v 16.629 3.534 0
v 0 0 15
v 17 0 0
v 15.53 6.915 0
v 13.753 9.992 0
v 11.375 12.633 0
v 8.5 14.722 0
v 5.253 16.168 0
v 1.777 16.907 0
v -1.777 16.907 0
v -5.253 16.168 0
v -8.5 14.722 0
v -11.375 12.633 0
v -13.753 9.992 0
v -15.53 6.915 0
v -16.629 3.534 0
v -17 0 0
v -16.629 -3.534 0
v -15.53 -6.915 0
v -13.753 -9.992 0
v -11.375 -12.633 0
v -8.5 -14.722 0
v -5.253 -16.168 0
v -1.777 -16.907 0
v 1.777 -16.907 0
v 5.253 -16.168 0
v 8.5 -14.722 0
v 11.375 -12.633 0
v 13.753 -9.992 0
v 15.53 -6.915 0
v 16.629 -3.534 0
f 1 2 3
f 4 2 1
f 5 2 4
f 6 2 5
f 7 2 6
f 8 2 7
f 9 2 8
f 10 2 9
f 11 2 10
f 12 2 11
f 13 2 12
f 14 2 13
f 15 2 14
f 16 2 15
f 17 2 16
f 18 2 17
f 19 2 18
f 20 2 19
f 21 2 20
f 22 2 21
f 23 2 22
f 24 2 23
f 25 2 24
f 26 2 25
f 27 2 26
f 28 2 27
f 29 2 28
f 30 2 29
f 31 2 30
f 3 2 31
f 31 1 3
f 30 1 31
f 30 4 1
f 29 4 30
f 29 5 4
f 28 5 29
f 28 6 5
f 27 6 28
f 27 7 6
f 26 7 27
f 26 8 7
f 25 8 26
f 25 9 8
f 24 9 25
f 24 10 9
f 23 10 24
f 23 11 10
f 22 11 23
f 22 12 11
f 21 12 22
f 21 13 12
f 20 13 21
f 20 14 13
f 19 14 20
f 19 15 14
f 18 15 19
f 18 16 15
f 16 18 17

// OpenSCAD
// Generated by SolidPython 1.0.1 on 2020-07-29 00:39:25


cylinder(h = 15, r1 = 17, r2 = 0);
/***********************************************
*********      SolidPython code:      **********
************************************************
 
# import packages: SolidPython
from solid import *
from solid.utils import *
from itertools import chain, combinations


class Resize:

    def __init__(self, scad_file):
        self.scad_file = scad_file
        #self.scad_file = import_scad(scad_file)
        # cone/cylinder param:
        self.r1 = 0
        self.r2 = 0
        self.h = 0
        # rectangular prism param:
        self.w = 0
        self.l = 0
        # ellipse param:
        self.r = 0

    # import OpenScad code (file name corresponds to shape)


    # classify shape + parameters
    def assign(self, param1, param2, param3):
        if self.scad_file == 'cone.scad':
            self.r1 = param1
            self.r2 = param2
            self.h = param3
        elif self.scad_file == 'cylinder.scad':
            self.r1 = param1
            self.r2 = param2
            self.h = param3
        elif self.scad_file == 'rectangularPrism.scad':
            self.h = param1
            self.l = param2
            self.w = param3
        else:
            self.r = param1
            self.h = param2

    # resize parameters
    def iterate(self):
        x = range(3, 20, 2)
        i = 1
        if self.scad_file == 'cone.scad':
            tempList = list(combinations(x, 2))
            for temp in tempList:
                param1 = temp[0]
                param2 = temp[1]
                filepath = 'produced_scad_files/' + 'cone' + str(param1) + '_' + str(param2) + '_' + '.scad'
                scad_render_to_file(cylinder(h=param1, r1=param2, r2=0), filepath)

        elif self.scad_file == 'cylinder.scad':
            tempList = list(combinations(x, 3))
            for temp in tempList:
                param1 = temp[0]
                param2 = temp[1]
                filepath = 'produced_scad_files/' + 'cylinder' + str(param1) + '_' + str(param2) + '_' + '.scad'
                scad_render_to_file(cylinder(h=param1, r1=param2, r2=param2), filepath)

        elif self.scad_file == 'rectangularPrism.scad':
            tempList = list(combinations(x, 3))
            for temp in tempList:
                param1 = temp[0]
                param2 = temp[1]
                param3 = temp[2]
                filepath = 'produced_scad_files/' + 'rectangularPrism' + str(param1) + '_' + str(param2) + '_' + str(
                    param3) + '.scad'
                scad_render_to_file(cube(size=(param1, param2, param3)), filepath)

        elif self.scad_file == 'ellipse.scad':
            tempList = list(combinations(x, 4))
            for temp in tempList:
                param1 = temp[0]
                param2 = temp[1]
                param3 = temp[2]
                param4 = temp[3]
                filepath = 'produced_scad_files/' + 'ellipse' + str(param1) + '_' + str(param2) + '_' + str(param3) + '_' + str(param4) + '.scad'
                scad_render_to_file(scale([param1, param2, param3])(sphere(r=param4)), filepath)

    def render_to_scadfile(self):
        scad_render_to_file(scad, 'example.scad') 
 
************************************************/
